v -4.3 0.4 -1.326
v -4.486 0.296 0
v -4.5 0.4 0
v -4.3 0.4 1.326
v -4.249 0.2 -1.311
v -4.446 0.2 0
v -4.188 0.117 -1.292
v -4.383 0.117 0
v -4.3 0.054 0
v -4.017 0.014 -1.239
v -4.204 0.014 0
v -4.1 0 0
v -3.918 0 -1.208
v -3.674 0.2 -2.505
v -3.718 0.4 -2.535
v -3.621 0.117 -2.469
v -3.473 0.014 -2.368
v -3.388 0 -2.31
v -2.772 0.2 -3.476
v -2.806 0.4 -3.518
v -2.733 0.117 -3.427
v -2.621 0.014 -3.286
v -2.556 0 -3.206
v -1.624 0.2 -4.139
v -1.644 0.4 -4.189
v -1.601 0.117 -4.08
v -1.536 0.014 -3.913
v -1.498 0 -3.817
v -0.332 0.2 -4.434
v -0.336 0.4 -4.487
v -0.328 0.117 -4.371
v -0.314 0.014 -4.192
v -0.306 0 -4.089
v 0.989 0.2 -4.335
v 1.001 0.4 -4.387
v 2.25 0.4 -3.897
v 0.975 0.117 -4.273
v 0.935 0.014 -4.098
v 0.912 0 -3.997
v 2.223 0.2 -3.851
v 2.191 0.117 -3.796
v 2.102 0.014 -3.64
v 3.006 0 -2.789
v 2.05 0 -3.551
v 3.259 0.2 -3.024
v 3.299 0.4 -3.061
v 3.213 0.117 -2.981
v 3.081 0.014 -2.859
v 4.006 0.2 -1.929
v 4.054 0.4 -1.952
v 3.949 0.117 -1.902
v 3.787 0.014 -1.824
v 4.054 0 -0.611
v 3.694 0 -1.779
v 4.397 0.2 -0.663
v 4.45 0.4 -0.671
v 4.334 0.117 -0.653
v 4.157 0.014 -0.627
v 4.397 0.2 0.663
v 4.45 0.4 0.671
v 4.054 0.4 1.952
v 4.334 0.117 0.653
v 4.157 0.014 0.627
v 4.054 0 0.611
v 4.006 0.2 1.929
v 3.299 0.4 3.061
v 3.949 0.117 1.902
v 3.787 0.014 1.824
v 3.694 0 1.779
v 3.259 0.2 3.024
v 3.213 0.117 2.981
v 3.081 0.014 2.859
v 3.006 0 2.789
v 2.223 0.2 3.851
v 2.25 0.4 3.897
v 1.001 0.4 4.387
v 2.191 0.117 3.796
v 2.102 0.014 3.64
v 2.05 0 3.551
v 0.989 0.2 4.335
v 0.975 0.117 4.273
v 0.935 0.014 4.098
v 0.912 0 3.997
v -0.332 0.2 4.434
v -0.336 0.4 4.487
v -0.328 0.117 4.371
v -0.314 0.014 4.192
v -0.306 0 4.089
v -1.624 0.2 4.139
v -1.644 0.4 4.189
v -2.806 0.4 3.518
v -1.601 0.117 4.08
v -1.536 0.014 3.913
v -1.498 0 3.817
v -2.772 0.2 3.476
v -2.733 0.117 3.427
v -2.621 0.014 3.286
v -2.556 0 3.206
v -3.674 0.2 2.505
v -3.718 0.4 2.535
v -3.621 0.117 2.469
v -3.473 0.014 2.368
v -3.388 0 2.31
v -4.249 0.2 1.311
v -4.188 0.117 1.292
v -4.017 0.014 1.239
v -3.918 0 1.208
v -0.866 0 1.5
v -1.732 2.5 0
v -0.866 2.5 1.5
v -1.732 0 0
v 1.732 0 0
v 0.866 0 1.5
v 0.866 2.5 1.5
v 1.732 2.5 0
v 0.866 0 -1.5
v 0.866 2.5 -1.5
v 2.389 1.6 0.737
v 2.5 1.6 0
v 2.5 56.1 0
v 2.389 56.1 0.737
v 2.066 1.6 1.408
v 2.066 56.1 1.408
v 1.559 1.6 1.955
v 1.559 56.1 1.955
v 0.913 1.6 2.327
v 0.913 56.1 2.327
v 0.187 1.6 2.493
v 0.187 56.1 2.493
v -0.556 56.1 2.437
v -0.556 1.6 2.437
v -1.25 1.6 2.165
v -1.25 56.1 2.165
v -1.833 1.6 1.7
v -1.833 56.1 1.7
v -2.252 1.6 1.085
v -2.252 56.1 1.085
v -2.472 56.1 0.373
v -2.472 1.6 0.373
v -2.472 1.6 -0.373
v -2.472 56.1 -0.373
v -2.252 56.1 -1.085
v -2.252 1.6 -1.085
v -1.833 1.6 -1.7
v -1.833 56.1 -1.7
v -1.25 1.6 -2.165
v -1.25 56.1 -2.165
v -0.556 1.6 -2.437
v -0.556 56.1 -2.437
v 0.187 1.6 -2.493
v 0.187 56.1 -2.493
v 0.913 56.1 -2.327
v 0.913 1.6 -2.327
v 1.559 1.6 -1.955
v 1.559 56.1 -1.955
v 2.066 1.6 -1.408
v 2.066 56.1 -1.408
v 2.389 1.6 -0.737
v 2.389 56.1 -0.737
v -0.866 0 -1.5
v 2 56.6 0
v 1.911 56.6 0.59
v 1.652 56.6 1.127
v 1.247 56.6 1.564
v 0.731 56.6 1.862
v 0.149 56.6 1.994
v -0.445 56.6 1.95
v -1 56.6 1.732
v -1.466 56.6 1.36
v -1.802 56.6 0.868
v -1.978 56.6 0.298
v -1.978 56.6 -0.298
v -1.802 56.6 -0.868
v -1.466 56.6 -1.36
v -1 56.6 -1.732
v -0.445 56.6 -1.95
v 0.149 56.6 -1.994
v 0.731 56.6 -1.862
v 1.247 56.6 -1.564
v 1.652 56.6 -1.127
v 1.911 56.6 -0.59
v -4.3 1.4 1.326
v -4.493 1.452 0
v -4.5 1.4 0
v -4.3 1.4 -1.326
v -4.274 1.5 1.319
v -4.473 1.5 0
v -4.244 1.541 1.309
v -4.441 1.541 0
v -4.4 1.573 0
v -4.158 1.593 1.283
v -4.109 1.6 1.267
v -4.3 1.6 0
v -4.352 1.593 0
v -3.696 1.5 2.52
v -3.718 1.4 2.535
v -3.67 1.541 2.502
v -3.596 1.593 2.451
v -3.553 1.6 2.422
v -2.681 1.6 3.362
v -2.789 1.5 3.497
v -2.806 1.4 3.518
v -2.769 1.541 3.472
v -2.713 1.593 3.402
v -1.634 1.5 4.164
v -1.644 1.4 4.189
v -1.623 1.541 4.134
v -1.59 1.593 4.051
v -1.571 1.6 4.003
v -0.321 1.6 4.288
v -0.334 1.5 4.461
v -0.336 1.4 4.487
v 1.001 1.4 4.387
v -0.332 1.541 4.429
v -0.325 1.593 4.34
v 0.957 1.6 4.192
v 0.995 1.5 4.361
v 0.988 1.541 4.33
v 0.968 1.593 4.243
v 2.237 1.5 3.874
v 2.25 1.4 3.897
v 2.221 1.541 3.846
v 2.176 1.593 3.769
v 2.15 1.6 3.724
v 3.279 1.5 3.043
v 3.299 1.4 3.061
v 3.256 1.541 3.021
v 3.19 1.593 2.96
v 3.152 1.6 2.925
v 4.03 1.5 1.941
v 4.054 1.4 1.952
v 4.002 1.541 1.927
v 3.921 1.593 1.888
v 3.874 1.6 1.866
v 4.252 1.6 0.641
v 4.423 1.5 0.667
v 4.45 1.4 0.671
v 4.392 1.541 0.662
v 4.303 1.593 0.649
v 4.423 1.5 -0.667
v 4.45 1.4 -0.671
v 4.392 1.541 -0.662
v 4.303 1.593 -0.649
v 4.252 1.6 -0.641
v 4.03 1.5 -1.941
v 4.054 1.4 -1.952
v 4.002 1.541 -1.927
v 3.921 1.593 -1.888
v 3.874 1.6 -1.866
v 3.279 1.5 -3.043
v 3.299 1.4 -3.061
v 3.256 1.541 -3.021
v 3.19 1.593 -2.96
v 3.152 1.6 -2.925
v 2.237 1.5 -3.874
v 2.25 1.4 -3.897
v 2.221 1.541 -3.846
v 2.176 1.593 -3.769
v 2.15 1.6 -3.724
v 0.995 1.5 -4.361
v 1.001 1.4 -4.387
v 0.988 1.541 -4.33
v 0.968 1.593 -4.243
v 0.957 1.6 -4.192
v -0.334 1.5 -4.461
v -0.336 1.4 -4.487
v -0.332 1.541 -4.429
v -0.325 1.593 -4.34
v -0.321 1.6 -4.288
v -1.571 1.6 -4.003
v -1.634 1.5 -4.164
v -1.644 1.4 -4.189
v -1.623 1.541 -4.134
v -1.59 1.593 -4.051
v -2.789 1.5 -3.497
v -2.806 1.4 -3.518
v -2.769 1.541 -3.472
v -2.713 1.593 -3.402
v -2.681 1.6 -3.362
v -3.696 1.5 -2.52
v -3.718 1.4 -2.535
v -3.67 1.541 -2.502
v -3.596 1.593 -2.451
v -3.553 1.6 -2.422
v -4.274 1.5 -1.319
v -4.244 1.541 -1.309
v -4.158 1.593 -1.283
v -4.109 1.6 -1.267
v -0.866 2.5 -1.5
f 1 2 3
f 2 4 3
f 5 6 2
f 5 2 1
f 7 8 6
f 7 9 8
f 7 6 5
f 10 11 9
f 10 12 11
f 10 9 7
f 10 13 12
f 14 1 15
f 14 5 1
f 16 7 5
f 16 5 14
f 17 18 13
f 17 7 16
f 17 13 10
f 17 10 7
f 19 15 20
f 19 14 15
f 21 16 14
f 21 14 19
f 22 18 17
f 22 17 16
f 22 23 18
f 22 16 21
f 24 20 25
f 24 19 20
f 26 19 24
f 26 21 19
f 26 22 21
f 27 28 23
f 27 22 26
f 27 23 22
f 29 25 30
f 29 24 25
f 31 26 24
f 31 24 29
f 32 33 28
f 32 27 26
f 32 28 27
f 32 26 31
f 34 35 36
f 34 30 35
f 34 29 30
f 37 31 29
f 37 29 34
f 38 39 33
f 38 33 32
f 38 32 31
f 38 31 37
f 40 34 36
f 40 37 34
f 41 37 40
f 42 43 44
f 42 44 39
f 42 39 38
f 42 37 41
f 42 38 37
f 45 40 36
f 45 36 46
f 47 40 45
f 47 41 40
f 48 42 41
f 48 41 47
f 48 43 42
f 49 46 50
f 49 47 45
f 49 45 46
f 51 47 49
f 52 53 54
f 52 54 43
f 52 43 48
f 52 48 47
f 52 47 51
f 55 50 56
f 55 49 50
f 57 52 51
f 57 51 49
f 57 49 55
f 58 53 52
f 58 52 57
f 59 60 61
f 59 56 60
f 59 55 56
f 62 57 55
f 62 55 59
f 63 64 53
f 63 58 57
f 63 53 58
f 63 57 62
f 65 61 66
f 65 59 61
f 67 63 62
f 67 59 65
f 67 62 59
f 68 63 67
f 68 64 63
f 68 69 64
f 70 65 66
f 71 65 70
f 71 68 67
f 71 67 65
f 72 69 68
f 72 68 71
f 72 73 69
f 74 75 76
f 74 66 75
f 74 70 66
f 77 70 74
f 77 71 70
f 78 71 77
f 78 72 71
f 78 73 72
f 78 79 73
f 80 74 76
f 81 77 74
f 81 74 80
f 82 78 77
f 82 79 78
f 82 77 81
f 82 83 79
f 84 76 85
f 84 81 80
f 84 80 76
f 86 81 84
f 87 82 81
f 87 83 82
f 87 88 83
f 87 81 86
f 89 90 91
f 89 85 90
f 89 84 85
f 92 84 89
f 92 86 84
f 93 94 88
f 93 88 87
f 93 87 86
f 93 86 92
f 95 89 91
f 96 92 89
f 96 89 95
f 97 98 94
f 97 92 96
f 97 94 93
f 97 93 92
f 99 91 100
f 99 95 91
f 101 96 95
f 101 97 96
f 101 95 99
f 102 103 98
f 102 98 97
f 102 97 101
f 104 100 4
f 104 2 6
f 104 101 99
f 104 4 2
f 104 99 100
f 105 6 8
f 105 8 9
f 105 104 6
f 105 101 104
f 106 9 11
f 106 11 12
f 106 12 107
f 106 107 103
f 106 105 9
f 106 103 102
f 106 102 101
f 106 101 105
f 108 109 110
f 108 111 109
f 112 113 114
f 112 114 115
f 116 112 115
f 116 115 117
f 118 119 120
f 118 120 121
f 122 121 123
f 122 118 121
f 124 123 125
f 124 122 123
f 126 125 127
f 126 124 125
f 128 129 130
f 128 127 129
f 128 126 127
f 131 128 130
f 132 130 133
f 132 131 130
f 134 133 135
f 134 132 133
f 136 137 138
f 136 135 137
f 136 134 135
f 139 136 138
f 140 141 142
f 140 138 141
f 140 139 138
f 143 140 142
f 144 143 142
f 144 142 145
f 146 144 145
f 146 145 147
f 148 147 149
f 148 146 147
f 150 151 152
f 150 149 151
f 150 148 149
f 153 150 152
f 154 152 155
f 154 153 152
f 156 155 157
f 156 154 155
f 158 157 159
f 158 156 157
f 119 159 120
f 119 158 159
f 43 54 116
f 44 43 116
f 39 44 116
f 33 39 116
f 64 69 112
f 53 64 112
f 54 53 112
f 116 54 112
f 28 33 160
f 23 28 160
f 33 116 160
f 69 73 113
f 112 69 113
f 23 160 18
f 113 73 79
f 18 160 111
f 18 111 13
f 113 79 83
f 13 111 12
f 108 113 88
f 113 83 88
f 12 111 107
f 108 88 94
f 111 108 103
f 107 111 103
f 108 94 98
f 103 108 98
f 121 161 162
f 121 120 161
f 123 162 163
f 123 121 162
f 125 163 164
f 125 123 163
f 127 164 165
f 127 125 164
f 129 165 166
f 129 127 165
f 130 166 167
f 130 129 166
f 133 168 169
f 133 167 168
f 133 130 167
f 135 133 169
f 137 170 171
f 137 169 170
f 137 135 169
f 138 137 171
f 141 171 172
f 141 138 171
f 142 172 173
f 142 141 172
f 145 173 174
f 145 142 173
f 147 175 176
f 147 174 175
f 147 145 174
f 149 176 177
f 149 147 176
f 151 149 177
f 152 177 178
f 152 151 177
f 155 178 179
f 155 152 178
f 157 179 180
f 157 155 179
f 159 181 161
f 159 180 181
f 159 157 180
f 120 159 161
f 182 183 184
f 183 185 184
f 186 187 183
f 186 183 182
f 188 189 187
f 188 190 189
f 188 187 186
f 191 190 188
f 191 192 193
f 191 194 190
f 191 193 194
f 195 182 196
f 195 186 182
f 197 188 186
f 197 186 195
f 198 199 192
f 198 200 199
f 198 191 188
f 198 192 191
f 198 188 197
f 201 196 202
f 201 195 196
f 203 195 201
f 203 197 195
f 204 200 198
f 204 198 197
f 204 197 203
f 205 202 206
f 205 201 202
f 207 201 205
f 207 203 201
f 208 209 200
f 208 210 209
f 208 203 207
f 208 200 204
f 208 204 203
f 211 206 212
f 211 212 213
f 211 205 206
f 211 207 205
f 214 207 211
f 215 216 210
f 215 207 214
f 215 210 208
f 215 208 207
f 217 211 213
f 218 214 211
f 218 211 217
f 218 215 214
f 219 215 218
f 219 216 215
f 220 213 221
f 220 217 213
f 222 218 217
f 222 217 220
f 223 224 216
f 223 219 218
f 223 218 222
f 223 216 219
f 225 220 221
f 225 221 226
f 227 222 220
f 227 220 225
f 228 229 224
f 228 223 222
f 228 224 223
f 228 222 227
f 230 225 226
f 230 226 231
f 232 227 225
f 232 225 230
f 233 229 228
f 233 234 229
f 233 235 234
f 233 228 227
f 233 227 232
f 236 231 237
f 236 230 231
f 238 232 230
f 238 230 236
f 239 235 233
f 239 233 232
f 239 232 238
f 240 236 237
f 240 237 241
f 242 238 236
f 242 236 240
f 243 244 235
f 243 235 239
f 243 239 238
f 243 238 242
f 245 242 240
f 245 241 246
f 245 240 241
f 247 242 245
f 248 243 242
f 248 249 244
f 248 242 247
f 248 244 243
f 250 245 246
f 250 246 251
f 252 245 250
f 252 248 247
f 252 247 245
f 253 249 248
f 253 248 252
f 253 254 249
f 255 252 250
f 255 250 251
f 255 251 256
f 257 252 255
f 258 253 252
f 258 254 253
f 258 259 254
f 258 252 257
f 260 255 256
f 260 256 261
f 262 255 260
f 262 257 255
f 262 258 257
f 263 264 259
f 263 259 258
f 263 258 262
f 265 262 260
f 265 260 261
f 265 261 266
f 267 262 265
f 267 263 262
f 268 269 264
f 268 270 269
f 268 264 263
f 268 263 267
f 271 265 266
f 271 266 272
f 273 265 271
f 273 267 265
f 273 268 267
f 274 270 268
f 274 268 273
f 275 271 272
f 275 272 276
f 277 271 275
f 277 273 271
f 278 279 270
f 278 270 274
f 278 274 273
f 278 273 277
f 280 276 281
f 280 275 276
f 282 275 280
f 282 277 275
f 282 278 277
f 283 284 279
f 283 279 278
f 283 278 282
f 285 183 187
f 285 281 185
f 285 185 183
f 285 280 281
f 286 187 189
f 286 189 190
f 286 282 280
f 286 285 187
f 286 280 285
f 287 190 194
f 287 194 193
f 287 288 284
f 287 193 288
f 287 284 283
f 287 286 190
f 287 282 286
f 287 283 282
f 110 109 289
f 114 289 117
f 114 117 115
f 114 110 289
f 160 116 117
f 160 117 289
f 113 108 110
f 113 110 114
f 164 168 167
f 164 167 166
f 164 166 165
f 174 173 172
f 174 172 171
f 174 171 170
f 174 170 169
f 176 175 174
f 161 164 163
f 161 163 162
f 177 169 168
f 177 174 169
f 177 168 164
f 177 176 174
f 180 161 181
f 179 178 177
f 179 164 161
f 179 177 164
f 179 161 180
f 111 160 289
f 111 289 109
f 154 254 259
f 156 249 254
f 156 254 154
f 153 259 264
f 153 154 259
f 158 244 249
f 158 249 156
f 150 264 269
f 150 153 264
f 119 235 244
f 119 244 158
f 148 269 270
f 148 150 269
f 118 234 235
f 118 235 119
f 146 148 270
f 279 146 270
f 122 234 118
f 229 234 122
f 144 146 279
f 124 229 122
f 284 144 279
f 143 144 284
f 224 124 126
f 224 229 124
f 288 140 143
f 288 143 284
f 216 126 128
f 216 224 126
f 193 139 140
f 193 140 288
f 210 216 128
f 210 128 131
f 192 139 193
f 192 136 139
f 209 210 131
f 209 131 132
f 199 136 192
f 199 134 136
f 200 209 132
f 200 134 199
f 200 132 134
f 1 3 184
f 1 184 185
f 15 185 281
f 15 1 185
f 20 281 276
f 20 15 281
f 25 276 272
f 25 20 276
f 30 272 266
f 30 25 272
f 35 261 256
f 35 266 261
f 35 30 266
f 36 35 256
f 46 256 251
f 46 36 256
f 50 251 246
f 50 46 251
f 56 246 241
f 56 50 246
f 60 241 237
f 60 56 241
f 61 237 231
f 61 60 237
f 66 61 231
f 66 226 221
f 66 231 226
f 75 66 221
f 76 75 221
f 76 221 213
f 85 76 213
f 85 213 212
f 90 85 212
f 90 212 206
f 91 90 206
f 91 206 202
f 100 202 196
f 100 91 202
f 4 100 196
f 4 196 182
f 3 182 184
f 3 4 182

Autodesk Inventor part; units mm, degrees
ref_plane "YZ Plane" through (0, 0, 0) normal (1, 0, 0) x (0, 1, 0)
ref_plane "XZ Plane" through (0, 0, 0) normal (0, 1, 0) x (-1, 0, 0)
ref_plane "XY Plane" through (0, 0, 0) normal (0, 0, 1) x (1, 0, 0)
sketch "Boceto1" plane through (0, 0, 0) normal (0, 1, 0) x (-1, 0, 0)
  circle A0 centre (0, 0) radius 4.5
  dimension "d0" = 9
extrude "Extrusión1" add sketch "Boceto1" along normal blind 1.6
sketch "Boceto2" plane through (0, 1.6, 0) normal (0, 1, 0) x (1, 0, 0)
  circle A0 centre (0, 0) radius 2.5
  dimension "d3" = 5
extrude "Extrusión2" add sketch "Boceto2" along normal blind 55
fillet "Empalme1" radius 0.4 1 edges at (4.5, 0, 0)
fillet "Empalme2" radius 0.2 1 edges at (4.5, 1.6, 0)
sketch "Boceto3" plane through (0, 0, 0) normal (0, -1, 0) x (1, 0, 0)
  line L0 (-1.7321, 0) -> (-0.866, 1.5)
  line L1 (-0.866, 1.5) -> (0.866, 1.5)
  line L2 (0.866, 1.5) -> (1.7321, 0)
  line L3 (1.7321, 0) -> (0.866, -1.5)
  line L4 (0.866, -1.5) -> (-0.866, -1.5)
  line L5 (-0.866, -1.5) -> (-1.7321, 0)
  point P0 (0, 0)
  point P1 (0, 0)
  dimension "d8" = 3
extrude "Extrusión3" cut sketch "Boceto3" against normal blind 2.5
chamfer "Chaflán1" distance 0.5 angle 45 1 edges at (-2.5, 56.6, 0)
thread "Rosca2" size "M5x0.8" class "6g" standard "ANSI Metric M Profile" length 20
properties part number "m5x55" material "Hierro, gris"
